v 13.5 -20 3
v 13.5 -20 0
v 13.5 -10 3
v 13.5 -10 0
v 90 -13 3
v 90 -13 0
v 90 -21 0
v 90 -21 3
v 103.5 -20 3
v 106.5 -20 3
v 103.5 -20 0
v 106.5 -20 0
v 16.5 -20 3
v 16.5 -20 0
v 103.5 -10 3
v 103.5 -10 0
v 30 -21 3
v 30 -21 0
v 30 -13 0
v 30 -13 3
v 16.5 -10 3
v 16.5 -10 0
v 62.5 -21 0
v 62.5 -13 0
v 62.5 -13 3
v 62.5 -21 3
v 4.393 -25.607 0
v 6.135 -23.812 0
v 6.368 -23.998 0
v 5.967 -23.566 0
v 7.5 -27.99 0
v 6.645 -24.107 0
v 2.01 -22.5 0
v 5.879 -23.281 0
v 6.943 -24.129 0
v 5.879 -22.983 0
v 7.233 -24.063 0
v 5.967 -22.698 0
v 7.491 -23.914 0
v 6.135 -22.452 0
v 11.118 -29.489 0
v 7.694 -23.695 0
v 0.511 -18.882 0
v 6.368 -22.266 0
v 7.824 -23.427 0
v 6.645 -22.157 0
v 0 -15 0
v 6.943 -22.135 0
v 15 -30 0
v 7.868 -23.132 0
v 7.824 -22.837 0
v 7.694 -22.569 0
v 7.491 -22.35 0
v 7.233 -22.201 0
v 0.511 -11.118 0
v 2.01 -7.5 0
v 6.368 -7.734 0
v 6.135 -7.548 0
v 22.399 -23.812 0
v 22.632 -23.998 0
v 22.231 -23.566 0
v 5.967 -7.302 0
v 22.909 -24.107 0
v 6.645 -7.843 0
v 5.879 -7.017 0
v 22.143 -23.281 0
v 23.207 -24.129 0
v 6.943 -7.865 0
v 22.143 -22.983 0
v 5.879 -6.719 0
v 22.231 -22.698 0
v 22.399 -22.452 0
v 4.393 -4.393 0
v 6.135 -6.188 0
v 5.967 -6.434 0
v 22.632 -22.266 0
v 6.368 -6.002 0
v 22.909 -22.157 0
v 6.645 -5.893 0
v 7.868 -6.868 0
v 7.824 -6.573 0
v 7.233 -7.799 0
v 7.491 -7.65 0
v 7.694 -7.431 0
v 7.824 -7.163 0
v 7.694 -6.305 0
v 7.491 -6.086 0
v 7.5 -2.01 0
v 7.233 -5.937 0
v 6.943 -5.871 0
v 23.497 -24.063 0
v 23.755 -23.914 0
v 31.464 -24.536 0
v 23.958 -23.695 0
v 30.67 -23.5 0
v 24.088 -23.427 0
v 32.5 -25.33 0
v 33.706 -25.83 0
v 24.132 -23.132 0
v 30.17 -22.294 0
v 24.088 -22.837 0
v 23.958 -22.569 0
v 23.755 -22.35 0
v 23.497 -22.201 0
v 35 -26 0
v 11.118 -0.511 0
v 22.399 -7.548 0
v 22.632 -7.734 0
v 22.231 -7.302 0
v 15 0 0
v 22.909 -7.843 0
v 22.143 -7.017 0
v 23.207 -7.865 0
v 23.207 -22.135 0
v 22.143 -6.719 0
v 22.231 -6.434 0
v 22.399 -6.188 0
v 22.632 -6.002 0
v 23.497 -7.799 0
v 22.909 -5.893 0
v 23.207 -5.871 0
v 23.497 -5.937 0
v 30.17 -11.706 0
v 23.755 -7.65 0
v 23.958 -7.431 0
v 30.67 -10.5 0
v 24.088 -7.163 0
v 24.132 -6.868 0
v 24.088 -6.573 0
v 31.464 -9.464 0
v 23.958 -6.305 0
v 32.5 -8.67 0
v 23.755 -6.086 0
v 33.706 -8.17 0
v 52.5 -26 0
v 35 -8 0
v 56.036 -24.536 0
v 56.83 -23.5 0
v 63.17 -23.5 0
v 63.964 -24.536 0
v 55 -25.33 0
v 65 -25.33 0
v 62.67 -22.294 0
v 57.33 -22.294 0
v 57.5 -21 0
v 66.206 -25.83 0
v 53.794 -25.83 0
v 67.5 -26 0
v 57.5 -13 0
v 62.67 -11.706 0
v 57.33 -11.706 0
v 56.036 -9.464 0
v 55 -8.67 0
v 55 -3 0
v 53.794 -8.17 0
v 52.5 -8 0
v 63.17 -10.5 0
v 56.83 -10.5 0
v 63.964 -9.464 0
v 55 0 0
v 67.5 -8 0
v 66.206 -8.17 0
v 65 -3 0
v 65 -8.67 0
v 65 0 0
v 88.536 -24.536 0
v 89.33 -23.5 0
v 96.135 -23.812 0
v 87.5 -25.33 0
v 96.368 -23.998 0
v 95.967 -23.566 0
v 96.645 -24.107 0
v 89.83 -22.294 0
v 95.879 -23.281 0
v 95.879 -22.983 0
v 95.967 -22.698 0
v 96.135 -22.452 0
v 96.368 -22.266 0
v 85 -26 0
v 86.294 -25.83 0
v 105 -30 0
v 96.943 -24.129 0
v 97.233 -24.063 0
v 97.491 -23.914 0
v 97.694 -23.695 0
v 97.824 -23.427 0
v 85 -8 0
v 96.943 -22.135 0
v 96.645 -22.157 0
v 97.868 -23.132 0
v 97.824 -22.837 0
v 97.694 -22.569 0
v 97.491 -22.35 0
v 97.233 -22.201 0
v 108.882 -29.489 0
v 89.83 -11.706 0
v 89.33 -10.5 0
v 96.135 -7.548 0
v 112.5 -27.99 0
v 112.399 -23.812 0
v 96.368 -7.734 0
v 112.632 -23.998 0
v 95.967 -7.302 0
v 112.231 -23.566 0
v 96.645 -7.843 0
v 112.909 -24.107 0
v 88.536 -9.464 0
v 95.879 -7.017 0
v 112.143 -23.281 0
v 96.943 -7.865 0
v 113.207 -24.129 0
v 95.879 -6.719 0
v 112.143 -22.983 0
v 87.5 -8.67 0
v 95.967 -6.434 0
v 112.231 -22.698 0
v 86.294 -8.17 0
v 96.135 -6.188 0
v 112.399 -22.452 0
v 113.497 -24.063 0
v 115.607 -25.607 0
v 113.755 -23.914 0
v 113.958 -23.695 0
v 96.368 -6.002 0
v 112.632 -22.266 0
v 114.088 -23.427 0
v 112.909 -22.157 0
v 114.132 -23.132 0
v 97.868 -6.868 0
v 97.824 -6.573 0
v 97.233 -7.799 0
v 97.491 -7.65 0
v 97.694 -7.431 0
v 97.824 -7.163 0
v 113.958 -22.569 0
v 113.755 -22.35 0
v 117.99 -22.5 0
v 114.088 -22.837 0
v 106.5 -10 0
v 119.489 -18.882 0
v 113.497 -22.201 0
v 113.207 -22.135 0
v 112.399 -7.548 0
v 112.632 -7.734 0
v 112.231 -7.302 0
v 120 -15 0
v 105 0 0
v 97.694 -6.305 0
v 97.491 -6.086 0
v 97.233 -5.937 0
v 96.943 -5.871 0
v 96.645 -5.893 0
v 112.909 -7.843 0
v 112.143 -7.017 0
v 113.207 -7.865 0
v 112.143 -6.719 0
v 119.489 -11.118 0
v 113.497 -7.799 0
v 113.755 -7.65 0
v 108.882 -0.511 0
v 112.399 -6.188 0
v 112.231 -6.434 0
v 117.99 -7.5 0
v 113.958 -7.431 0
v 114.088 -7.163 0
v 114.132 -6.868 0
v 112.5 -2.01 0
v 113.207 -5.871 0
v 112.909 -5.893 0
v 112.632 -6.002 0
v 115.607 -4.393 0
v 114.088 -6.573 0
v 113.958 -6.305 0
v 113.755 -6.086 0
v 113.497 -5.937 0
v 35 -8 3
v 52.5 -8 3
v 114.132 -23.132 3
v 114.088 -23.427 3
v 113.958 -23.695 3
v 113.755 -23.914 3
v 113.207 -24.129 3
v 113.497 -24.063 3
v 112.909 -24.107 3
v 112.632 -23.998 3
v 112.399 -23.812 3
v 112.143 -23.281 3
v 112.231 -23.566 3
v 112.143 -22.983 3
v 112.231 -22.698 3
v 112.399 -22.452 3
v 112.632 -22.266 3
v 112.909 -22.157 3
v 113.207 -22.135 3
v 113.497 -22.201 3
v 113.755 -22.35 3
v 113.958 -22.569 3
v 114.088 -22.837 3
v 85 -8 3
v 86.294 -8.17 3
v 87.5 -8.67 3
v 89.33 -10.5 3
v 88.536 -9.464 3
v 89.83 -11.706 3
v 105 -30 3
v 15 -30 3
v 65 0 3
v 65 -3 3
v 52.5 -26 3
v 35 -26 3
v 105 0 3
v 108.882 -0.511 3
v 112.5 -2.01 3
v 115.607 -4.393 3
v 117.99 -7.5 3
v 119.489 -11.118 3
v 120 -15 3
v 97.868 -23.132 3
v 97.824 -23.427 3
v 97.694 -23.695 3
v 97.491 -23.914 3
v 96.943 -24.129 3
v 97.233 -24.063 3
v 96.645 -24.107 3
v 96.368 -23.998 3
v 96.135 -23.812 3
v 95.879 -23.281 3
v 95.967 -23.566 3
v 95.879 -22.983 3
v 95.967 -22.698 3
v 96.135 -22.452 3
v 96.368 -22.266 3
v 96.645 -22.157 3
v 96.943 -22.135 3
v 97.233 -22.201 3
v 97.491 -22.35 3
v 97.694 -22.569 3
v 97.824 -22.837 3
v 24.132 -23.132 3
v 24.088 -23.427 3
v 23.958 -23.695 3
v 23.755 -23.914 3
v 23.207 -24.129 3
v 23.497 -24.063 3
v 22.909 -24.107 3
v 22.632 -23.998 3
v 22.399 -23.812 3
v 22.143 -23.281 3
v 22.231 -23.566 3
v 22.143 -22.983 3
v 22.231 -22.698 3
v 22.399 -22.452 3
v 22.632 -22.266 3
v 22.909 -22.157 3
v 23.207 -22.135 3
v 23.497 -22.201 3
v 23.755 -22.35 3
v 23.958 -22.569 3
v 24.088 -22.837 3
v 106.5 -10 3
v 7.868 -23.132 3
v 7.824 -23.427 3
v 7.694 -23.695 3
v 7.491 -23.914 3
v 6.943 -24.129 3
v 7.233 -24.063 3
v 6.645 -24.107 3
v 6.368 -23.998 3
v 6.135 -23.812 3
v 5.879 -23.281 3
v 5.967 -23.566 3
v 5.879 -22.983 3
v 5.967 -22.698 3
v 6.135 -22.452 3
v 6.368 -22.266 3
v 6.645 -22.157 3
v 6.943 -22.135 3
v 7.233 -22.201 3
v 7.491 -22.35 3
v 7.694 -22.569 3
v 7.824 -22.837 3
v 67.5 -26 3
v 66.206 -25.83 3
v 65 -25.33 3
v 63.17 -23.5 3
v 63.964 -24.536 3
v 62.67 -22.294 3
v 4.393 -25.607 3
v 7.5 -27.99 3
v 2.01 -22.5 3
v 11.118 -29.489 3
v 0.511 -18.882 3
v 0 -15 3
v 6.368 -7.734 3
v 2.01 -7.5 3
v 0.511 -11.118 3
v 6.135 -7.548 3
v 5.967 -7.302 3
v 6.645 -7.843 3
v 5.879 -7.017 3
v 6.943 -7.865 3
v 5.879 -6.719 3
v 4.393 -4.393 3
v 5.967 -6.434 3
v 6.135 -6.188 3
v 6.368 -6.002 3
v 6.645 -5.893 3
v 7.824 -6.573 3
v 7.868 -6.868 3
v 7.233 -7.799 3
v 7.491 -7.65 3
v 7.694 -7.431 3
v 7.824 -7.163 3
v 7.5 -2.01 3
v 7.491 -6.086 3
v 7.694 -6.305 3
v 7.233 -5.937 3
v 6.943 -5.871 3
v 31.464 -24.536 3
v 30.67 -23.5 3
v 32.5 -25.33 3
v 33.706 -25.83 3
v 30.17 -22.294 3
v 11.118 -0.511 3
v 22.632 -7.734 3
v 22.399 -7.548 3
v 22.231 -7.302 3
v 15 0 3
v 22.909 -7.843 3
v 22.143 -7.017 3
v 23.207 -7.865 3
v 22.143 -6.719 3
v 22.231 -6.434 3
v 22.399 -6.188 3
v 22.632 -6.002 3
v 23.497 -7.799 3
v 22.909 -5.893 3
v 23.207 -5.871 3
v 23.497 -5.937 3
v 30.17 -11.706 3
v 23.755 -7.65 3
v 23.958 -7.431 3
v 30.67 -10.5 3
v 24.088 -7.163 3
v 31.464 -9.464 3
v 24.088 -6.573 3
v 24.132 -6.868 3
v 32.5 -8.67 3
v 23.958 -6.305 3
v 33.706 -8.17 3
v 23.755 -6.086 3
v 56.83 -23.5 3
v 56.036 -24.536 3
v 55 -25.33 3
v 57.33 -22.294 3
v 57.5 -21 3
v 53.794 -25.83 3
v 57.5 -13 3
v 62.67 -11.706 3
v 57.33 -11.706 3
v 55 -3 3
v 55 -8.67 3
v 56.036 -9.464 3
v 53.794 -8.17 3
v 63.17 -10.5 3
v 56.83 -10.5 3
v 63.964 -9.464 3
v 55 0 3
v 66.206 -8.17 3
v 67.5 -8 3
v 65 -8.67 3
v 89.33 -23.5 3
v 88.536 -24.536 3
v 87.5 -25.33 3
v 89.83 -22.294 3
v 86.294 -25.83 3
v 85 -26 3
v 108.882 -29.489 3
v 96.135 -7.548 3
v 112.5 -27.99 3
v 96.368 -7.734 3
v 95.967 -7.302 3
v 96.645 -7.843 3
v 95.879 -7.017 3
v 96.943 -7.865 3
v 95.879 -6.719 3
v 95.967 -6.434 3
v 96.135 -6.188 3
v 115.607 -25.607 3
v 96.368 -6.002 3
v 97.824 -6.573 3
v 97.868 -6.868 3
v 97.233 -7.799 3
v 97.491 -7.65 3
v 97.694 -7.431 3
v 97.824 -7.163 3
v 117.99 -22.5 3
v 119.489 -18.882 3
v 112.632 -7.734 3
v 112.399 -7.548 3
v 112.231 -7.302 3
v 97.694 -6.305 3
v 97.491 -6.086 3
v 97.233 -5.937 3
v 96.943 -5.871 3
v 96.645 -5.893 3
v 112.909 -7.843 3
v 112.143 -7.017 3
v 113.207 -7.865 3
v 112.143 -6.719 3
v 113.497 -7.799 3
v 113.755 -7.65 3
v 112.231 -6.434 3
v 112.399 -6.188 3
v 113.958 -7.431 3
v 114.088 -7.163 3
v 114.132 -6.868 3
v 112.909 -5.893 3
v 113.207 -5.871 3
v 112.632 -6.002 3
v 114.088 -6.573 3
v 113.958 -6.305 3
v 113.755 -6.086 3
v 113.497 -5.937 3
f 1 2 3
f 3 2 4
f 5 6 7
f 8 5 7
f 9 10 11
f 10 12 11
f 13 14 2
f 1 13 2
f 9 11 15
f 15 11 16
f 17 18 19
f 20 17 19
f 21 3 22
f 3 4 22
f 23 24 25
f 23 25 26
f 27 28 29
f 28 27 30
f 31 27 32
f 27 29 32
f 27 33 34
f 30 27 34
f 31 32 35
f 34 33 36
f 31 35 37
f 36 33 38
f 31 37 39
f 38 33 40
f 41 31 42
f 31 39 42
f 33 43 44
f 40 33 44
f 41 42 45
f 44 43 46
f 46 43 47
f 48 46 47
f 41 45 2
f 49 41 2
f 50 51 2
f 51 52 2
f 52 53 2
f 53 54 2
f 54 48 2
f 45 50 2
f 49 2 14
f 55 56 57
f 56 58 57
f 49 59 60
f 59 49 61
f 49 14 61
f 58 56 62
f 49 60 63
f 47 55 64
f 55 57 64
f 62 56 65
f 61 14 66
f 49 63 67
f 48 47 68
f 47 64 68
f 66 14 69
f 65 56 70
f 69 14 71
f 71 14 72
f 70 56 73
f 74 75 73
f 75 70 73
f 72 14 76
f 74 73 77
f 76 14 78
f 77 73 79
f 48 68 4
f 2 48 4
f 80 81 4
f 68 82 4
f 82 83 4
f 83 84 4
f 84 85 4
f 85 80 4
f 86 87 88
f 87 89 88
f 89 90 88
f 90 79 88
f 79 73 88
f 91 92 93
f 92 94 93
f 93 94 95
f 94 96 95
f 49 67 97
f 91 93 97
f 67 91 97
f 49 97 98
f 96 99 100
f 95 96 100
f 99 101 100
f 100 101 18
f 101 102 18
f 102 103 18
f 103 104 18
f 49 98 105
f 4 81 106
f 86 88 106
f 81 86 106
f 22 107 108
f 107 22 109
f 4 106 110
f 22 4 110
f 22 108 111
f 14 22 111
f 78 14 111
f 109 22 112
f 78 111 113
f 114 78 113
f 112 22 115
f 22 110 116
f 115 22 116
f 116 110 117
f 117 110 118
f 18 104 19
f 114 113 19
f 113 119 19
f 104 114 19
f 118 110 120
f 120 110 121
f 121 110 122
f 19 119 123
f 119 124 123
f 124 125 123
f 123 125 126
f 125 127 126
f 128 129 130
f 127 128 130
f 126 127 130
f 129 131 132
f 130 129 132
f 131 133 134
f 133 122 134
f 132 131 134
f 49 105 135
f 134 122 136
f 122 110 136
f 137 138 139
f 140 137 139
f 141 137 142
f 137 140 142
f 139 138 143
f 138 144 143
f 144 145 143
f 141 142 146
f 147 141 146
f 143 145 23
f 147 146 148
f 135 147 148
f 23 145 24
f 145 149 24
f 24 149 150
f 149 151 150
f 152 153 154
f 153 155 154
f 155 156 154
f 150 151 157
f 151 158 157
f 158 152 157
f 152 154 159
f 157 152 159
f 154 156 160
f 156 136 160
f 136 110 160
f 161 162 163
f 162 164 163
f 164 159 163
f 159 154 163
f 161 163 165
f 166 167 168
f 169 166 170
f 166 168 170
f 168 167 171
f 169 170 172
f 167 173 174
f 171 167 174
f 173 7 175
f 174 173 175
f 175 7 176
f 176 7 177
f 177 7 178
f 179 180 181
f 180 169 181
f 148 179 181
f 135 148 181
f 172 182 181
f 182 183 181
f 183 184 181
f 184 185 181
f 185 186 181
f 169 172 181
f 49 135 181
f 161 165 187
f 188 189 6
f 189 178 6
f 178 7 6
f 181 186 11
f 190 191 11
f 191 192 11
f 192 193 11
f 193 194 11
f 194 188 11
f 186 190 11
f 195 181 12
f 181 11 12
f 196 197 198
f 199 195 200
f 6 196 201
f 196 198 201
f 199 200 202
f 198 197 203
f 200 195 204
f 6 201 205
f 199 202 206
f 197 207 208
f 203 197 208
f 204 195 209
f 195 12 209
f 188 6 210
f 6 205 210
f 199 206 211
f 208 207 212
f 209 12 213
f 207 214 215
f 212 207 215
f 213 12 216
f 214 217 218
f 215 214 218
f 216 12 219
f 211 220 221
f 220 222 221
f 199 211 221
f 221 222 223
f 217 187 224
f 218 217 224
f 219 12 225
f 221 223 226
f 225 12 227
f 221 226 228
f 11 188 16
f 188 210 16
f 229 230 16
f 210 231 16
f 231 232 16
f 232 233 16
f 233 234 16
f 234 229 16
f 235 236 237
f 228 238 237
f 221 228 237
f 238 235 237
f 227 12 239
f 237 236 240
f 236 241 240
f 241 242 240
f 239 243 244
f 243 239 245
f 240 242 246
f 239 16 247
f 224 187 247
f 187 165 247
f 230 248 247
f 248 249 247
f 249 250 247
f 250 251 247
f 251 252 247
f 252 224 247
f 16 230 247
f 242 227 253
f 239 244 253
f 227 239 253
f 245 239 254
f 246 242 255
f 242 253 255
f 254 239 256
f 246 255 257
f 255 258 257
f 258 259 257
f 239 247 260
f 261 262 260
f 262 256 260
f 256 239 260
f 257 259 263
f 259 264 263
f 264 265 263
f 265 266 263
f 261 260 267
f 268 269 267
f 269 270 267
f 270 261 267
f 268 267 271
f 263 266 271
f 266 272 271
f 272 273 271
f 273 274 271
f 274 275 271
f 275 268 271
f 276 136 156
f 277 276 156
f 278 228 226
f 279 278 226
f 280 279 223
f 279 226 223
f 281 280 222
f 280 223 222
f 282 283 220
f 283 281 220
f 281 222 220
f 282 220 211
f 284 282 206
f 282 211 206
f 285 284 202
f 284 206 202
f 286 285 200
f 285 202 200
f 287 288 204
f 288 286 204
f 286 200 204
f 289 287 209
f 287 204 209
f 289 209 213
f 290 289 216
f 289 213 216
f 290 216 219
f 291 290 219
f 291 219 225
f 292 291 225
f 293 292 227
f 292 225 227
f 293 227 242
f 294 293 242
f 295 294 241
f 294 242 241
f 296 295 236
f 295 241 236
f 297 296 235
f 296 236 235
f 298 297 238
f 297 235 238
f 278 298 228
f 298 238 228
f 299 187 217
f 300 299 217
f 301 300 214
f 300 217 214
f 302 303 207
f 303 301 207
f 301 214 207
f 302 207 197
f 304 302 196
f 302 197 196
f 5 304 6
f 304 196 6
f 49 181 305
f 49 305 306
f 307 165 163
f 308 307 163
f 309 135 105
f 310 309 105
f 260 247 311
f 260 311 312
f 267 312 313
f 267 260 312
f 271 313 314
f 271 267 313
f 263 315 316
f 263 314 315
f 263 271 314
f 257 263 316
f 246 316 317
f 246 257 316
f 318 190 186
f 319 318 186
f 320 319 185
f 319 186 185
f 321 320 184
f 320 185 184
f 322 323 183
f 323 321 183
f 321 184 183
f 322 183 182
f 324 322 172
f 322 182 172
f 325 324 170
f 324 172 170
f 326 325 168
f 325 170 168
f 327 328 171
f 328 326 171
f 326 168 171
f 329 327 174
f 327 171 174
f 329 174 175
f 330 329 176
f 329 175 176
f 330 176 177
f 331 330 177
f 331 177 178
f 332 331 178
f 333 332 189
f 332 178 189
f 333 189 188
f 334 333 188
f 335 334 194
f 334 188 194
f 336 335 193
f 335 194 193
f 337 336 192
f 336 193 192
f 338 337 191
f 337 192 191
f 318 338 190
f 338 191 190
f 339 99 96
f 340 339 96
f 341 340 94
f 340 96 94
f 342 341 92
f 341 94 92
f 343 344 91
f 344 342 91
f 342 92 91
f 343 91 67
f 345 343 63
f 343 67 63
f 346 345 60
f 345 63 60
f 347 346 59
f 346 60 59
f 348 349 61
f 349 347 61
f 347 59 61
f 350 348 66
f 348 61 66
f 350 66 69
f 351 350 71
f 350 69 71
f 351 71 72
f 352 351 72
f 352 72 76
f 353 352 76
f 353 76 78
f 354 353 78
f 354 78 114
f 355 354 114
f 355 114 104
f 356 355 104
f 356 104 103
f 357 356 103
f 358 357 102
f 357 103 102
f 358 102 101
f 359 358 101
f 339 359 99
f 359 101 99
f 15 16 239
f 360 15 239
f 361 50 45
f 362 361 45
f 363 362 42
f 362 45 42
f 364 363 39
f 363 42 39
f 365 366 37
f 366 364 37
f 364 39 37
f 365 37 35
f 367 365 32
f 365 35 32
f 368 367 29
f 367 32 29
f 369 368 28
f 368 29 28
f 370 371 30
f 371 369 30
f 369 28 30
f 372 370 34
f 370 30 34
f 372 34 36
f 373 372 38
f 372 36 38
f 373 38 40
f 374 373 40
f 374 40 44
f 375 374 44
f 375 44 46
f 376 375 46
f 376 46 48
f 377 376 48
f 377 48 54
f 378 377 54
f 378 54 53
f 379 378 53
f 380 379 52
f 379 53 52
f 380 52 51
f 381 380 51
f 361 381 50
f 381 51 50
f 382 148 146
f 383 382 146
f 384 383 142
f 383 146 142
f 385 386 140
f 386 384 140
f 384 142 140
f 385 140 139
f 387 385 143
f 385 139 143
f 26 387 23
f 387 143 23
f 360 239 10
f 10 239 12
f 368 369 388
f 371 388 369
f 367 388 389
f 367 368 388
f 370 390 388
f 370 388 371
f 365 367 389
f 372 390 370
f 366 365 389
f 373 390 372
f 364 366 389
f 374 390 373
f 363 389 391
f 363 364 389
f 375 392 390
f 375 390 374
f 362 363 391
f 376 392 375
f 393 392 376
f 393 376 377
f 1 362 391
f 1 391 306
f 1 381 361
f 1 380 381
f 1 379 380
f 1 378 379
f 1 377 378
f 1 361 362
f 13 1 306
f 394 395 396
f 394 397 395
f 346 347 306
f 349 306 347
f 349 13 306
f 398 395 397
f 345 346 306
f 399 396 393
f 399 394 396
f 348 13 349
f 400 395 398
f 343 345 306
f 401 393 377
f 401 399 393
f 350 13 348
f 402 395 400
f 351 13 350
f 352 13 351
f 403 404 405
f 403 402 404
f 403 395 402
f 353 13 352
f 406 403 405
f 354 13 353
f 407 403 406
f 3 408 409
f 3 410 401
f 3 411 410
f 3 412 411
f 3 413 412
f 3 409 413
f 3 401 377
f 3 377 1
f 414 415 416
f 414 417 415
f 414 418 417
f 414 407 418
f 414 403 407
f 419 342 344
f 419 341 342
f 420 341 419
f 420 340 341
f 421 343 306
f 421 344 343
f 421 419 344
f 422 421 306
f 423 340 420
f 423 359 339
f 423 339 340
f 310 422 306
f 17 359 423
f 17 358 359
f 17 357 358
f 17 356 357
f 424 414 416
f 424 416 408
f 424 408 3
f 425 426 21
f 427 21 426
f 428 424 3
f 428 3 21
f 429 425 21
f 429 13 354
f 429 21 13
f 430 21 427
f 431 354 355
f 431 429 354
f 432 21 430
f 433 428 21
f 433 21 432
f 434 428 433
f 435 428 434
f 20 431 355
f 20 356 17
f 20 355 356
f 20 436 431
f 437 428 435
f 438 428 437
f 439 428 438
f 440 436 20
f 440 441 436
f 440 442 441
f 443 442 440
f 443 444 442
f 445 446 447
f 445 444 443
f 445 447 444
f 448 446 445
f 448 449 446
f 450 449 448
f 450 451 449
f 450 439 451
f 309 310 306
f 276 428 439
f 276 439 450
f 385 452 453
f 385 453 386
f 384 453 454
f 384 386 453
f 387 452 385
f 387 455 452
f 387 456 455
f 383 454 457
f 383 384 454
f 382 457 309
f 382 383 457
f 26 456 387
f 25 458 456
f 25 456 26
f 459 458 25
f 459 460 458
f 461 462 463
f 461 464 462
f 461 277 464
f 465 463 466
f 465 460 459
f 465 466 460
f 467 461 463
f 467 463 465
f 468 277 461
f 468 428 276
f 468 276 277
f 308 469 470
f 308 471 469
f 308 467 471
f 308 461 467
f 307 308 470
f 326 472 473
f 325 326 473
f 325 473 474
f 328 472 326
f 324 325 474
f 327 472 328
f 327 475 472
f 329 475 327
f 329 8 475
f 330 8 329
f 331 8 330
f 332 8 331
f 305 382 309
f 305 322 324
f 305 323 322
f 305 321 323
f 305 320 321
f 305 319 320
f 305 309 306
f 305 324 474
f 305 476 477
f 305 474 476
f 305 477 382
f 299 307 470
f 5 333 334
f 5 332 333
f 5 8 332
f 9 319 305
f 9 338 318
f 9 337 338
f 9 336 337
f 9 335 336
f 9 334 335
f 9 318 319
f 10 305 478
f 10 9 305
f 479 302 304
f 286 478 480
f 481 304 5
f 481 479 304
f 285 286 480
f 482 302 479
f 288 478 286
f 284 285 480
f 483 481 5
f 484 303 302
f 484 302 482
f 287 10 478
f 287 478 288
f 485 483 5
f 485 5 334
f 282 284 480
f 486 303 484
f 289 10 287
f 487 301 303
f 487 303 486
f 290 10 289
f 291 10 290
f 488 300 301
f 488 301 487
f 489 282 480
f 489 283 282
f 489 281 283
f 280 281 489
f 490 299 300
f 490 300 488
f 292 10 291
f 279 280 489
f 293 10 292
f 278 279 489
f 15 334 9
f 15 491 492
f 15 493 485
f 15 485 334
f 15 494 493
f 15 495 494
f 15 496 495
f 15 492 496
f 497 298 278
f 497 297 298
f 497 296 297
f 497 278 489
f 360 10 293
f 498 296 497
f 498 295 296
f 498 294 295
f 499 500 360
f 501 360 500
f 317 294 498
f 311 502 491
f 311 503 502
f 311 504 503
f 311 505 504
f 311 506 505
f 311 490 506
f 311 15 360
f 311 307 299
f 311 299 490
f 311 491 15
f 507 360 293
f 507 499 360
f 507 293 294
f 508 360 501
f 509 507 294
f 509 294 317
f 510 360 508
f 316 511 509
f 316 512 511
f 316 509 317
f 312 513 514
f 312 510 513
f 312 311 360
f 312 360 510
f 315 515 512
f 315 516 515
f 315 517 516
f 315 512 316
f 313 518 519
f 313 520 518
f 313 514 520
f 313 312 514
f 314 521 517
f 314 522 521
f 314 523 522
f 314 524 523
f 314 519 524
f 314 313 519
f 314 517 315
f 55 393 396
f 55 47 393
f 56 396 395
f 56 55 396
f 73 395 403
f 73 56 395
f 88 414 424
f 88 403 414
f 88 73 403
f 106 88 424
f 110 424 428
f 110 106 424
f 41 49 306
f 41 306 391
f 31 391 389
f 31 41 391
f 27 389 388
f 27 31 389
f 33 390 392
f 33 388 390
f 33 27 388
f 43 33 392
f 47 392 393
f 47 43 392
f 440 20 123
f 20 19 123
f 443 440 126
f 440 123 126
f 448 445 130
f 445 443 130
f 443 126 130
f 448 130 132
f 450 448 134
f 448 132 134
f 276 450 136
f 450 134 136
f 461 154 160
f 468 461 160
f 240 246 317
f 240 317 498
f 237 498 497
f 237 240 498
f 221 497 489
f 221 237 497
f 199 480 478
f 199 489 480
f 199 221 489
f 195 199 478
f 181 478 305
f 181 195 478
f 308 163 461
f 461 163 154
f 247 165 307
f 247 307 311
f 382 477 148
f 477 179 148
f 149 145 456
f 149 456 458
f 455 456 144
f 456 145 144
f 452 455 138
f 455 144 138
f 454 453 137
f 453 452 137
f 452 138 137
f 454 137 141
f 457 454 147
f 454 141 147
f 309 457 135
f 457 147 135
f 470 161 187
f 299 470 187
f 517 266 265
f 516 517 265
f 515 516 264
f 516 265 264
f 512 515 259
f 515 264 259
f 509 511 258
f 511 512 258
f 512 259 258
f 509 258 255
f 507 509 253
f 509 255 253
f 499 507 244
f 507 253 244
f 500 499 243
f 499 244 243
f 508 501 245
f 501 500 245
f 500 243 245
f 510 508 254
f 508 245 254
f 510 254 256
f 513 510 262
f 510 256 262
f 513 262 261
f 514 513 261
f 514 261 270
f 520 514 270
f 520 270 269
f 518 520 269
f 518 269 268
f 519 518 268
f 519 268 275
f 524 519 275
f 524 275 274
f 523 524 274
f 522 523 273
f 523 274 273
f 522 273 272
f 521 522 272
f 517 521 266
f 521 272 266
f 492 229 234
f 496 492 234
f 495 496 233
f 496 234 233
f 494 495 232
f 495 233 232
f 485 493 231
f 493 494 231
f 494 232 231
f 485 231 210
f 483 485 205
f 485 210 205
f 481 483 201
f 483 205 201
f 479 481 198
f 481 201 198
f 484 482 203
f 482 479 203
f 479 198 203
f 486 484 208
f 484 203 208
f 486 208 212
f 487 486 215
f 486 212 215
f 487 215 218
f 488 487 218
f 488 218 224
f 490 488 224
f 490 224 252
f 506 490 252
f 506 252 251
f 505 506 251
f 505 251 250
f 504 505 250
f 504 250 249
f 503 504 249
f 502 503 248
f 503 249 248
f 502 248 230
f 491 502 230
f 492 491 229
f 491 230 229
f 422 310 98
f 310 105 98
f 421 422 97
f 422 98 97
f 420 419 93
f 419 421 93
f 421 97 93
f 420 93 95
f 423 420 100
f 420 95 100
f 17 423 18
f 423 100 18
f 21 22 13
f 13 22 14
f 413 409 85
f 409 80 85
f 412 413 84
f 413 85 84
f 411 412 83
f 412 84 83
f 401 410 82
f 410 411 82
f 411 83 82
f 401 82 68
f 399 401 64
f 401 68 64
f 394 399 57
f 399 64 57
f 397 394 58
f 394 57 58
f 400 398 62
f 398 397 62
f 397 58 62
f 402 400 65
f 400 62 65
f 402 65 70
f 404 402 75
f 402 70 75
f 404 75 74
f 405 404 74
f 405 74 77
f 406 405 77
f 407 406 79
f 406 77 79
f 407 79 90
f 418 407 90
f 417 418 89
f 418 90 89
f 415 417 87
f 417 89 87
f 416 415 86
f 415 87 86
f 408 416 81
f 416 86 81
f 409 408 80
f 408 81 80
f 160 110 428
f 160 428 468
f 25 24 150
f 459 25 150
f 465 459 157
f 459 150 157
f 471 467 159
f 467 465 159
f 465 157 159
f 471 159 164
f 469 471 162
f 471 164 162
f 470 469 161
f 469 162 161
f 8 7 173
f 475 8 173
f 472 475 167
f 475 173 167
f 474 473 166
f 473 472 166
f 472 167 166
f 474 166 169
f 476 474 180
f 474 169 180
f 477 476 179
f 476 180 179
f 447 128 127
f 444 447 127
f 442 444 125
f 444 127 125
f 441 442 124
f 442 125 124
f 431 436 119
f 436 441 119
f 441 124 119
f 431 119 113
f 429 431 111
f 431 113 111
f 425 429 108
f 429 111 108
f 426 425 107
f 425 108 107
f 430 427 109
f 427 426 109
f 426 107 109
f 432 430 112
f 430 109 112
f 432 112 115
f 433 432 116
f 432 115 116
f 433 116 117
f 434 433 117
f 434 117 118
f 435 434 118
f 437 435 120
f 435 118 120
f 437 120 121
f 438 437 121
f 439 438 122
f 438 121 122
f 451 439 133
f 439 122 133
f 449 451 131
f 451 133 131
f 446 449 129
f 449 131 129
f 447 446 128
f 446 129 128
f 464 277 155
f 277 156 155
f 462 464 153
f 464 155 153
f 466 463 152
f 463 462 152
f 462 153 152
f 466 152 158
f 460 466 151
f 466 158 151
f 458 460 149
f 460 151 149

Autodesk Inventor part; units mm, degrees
ref_plane "YZ Plane" through (0, 0, 0) normal (1, 0, 0) x (0, 1, 0)
ref_plane "XZ Plane" through (0, 0, 0) normal (0, 1, 0) x (-1, 0, 0)
ref_plane "XY Plane" through (0, 0, 0) normal (0, 0, 1) x (1, 0, 0)
sketch "Sketch1" plane through (0, 0, 0) normal (0, 0, 1) x (1, 0, 0)
  line L0 (120, -15) -> (120, -15)
  line L1 (105, -30) -> (15, -30)
  line L2 (0, -15) -> (0, -15)
  line L3 (13.5, -10) -> (16.5, -10)
  line L4 (16.5, -10) -> (16.5, -20)
  line L5 (16.5, -20) -> (13.5, -20)
  line L6 (13.5, -20) -> (13.5, -10)
  line L7 (103.5, -10) -> (106.5, -10)
  line L8 (106.5, -10) -> (106.5, -20)
  line L9 (106.5, -20) -> (103.5, -20)
  line L10 (103.5, -20) -> (103.5, -10)
  arc A0 (15, 0) -> (0, -15) centre (15, -15) ccw
  arc A1 (0, -15) -> (15, -30) centre (15, -15) ccw
  arc A2 (105, -30) -> (120, -15) centre (105, -15) ccw
  arc A3 (120, -15) -> (105, 0) centre (105, -15) ccw
  line L11 (65, 0) -> (65, -3)
  line L12 (65, -3) -> (55, -3)
  line L13 (55, -3) -> (55, 0)
  line L14 (15, 0) -> (55, 0)
  line L15 (65, 0) -> (105, 0)
  line L16 (90, -13) -> (90, -21)
  line L17 (30, -21) -> (30, -13)
  arc A4 (35, -8) -> (30, -13) centre (35, -13) ccw
  arc A5 (90, -13) -> (85, -8) centre (85, -13) ccw
  arc A6 (85, -26) -> (90, -21) centre (85, -21) ccw
  arc A7 (30, -21) -> (35, -26) centre (35, -21) ccw
  line L18 (62.5, -13) -> (62.5, -21)
  line L19 (57.5, -21) -> (57.5, -13)
  line L20 (35, -8) -> (52.5, -8)
  line L21 (67.5, -8) -> (85, -8)
  line L22 (85, -26) -> (67.5, -26)
  line L23 (52.5, -26) -> (35, -26)
  arc A8 (57.5, -13) -> (52.5, -8) centre (52.5, -13) ccw
  arc A9 (52.5, -26) -> (57.5, -21) centre (52.5, -21) ccw
  arc A10 (62.5, -21) -> (67.5, -26) centre (67.5, -21) ccw
  arc A11 (67.5, -8) -> (62.5, -13) centre (67.5, -13) ccw
  circle A12 centre (6.868, -6.868) radius 1
  circle A13 centre (6.868, -23.132) radius 1
  circle A14 centre (23.132, -23.132) radius 1
  circle A15 centre (23.132, -6.868) radius 1
  circle A16 centre (113.132, -6.868) radius 1
  circle A17 centre (96.868, -6.868) radius 1
  circle A18 centre (96.868, -23.132) radius 1
  circle A19 centre (113.132, -23.132) radius 1
  point P0 (0, 0)
  point P1 (120, 0)
  point P2 (0, -30)
  dimension "d0" = 30
  dimension "d1" = 120
  dimension "d2" = 10
  dimension "d3" = 3
  dimension "d4" = 13.5
  dimension "d5" = 10
  dimension "d6" = 87
  dimension "d7" = 3
  dimension "d8" = 10
  dimension "d9" = 10
  dimension "d10" = 15
  dimension "d11" = 10
  dimension "d12" = 55
  dimension "d13" = 3
  dimension "d18" = 30
  dimension "d19" = 30
  dimension "d20" = 5
  dimension "d23" = 27.5
  dimension "d24" = 27.5
  dimension "d25" = 5
  dimension "d26" = 5
  dimension "d27" = 8
  dimension "d30" = 2
  dimension "d31" = 8.132
  dimension "d32" = 8.132
  dimension "d35" = 360
  dimension "d37" = 2
  dimension "d40" = 8.132
  dimension "d41" = 8.132
  dimension "d44" = 360
  dimension "d48" = 18
  dimension "d50" = 3
  dimension "d51" = 15
extrude "Extrusion4" add sketch "Sketch1" along normal blind 3
properties part number "OpenROV 2_1 Mid Bulkhead"
